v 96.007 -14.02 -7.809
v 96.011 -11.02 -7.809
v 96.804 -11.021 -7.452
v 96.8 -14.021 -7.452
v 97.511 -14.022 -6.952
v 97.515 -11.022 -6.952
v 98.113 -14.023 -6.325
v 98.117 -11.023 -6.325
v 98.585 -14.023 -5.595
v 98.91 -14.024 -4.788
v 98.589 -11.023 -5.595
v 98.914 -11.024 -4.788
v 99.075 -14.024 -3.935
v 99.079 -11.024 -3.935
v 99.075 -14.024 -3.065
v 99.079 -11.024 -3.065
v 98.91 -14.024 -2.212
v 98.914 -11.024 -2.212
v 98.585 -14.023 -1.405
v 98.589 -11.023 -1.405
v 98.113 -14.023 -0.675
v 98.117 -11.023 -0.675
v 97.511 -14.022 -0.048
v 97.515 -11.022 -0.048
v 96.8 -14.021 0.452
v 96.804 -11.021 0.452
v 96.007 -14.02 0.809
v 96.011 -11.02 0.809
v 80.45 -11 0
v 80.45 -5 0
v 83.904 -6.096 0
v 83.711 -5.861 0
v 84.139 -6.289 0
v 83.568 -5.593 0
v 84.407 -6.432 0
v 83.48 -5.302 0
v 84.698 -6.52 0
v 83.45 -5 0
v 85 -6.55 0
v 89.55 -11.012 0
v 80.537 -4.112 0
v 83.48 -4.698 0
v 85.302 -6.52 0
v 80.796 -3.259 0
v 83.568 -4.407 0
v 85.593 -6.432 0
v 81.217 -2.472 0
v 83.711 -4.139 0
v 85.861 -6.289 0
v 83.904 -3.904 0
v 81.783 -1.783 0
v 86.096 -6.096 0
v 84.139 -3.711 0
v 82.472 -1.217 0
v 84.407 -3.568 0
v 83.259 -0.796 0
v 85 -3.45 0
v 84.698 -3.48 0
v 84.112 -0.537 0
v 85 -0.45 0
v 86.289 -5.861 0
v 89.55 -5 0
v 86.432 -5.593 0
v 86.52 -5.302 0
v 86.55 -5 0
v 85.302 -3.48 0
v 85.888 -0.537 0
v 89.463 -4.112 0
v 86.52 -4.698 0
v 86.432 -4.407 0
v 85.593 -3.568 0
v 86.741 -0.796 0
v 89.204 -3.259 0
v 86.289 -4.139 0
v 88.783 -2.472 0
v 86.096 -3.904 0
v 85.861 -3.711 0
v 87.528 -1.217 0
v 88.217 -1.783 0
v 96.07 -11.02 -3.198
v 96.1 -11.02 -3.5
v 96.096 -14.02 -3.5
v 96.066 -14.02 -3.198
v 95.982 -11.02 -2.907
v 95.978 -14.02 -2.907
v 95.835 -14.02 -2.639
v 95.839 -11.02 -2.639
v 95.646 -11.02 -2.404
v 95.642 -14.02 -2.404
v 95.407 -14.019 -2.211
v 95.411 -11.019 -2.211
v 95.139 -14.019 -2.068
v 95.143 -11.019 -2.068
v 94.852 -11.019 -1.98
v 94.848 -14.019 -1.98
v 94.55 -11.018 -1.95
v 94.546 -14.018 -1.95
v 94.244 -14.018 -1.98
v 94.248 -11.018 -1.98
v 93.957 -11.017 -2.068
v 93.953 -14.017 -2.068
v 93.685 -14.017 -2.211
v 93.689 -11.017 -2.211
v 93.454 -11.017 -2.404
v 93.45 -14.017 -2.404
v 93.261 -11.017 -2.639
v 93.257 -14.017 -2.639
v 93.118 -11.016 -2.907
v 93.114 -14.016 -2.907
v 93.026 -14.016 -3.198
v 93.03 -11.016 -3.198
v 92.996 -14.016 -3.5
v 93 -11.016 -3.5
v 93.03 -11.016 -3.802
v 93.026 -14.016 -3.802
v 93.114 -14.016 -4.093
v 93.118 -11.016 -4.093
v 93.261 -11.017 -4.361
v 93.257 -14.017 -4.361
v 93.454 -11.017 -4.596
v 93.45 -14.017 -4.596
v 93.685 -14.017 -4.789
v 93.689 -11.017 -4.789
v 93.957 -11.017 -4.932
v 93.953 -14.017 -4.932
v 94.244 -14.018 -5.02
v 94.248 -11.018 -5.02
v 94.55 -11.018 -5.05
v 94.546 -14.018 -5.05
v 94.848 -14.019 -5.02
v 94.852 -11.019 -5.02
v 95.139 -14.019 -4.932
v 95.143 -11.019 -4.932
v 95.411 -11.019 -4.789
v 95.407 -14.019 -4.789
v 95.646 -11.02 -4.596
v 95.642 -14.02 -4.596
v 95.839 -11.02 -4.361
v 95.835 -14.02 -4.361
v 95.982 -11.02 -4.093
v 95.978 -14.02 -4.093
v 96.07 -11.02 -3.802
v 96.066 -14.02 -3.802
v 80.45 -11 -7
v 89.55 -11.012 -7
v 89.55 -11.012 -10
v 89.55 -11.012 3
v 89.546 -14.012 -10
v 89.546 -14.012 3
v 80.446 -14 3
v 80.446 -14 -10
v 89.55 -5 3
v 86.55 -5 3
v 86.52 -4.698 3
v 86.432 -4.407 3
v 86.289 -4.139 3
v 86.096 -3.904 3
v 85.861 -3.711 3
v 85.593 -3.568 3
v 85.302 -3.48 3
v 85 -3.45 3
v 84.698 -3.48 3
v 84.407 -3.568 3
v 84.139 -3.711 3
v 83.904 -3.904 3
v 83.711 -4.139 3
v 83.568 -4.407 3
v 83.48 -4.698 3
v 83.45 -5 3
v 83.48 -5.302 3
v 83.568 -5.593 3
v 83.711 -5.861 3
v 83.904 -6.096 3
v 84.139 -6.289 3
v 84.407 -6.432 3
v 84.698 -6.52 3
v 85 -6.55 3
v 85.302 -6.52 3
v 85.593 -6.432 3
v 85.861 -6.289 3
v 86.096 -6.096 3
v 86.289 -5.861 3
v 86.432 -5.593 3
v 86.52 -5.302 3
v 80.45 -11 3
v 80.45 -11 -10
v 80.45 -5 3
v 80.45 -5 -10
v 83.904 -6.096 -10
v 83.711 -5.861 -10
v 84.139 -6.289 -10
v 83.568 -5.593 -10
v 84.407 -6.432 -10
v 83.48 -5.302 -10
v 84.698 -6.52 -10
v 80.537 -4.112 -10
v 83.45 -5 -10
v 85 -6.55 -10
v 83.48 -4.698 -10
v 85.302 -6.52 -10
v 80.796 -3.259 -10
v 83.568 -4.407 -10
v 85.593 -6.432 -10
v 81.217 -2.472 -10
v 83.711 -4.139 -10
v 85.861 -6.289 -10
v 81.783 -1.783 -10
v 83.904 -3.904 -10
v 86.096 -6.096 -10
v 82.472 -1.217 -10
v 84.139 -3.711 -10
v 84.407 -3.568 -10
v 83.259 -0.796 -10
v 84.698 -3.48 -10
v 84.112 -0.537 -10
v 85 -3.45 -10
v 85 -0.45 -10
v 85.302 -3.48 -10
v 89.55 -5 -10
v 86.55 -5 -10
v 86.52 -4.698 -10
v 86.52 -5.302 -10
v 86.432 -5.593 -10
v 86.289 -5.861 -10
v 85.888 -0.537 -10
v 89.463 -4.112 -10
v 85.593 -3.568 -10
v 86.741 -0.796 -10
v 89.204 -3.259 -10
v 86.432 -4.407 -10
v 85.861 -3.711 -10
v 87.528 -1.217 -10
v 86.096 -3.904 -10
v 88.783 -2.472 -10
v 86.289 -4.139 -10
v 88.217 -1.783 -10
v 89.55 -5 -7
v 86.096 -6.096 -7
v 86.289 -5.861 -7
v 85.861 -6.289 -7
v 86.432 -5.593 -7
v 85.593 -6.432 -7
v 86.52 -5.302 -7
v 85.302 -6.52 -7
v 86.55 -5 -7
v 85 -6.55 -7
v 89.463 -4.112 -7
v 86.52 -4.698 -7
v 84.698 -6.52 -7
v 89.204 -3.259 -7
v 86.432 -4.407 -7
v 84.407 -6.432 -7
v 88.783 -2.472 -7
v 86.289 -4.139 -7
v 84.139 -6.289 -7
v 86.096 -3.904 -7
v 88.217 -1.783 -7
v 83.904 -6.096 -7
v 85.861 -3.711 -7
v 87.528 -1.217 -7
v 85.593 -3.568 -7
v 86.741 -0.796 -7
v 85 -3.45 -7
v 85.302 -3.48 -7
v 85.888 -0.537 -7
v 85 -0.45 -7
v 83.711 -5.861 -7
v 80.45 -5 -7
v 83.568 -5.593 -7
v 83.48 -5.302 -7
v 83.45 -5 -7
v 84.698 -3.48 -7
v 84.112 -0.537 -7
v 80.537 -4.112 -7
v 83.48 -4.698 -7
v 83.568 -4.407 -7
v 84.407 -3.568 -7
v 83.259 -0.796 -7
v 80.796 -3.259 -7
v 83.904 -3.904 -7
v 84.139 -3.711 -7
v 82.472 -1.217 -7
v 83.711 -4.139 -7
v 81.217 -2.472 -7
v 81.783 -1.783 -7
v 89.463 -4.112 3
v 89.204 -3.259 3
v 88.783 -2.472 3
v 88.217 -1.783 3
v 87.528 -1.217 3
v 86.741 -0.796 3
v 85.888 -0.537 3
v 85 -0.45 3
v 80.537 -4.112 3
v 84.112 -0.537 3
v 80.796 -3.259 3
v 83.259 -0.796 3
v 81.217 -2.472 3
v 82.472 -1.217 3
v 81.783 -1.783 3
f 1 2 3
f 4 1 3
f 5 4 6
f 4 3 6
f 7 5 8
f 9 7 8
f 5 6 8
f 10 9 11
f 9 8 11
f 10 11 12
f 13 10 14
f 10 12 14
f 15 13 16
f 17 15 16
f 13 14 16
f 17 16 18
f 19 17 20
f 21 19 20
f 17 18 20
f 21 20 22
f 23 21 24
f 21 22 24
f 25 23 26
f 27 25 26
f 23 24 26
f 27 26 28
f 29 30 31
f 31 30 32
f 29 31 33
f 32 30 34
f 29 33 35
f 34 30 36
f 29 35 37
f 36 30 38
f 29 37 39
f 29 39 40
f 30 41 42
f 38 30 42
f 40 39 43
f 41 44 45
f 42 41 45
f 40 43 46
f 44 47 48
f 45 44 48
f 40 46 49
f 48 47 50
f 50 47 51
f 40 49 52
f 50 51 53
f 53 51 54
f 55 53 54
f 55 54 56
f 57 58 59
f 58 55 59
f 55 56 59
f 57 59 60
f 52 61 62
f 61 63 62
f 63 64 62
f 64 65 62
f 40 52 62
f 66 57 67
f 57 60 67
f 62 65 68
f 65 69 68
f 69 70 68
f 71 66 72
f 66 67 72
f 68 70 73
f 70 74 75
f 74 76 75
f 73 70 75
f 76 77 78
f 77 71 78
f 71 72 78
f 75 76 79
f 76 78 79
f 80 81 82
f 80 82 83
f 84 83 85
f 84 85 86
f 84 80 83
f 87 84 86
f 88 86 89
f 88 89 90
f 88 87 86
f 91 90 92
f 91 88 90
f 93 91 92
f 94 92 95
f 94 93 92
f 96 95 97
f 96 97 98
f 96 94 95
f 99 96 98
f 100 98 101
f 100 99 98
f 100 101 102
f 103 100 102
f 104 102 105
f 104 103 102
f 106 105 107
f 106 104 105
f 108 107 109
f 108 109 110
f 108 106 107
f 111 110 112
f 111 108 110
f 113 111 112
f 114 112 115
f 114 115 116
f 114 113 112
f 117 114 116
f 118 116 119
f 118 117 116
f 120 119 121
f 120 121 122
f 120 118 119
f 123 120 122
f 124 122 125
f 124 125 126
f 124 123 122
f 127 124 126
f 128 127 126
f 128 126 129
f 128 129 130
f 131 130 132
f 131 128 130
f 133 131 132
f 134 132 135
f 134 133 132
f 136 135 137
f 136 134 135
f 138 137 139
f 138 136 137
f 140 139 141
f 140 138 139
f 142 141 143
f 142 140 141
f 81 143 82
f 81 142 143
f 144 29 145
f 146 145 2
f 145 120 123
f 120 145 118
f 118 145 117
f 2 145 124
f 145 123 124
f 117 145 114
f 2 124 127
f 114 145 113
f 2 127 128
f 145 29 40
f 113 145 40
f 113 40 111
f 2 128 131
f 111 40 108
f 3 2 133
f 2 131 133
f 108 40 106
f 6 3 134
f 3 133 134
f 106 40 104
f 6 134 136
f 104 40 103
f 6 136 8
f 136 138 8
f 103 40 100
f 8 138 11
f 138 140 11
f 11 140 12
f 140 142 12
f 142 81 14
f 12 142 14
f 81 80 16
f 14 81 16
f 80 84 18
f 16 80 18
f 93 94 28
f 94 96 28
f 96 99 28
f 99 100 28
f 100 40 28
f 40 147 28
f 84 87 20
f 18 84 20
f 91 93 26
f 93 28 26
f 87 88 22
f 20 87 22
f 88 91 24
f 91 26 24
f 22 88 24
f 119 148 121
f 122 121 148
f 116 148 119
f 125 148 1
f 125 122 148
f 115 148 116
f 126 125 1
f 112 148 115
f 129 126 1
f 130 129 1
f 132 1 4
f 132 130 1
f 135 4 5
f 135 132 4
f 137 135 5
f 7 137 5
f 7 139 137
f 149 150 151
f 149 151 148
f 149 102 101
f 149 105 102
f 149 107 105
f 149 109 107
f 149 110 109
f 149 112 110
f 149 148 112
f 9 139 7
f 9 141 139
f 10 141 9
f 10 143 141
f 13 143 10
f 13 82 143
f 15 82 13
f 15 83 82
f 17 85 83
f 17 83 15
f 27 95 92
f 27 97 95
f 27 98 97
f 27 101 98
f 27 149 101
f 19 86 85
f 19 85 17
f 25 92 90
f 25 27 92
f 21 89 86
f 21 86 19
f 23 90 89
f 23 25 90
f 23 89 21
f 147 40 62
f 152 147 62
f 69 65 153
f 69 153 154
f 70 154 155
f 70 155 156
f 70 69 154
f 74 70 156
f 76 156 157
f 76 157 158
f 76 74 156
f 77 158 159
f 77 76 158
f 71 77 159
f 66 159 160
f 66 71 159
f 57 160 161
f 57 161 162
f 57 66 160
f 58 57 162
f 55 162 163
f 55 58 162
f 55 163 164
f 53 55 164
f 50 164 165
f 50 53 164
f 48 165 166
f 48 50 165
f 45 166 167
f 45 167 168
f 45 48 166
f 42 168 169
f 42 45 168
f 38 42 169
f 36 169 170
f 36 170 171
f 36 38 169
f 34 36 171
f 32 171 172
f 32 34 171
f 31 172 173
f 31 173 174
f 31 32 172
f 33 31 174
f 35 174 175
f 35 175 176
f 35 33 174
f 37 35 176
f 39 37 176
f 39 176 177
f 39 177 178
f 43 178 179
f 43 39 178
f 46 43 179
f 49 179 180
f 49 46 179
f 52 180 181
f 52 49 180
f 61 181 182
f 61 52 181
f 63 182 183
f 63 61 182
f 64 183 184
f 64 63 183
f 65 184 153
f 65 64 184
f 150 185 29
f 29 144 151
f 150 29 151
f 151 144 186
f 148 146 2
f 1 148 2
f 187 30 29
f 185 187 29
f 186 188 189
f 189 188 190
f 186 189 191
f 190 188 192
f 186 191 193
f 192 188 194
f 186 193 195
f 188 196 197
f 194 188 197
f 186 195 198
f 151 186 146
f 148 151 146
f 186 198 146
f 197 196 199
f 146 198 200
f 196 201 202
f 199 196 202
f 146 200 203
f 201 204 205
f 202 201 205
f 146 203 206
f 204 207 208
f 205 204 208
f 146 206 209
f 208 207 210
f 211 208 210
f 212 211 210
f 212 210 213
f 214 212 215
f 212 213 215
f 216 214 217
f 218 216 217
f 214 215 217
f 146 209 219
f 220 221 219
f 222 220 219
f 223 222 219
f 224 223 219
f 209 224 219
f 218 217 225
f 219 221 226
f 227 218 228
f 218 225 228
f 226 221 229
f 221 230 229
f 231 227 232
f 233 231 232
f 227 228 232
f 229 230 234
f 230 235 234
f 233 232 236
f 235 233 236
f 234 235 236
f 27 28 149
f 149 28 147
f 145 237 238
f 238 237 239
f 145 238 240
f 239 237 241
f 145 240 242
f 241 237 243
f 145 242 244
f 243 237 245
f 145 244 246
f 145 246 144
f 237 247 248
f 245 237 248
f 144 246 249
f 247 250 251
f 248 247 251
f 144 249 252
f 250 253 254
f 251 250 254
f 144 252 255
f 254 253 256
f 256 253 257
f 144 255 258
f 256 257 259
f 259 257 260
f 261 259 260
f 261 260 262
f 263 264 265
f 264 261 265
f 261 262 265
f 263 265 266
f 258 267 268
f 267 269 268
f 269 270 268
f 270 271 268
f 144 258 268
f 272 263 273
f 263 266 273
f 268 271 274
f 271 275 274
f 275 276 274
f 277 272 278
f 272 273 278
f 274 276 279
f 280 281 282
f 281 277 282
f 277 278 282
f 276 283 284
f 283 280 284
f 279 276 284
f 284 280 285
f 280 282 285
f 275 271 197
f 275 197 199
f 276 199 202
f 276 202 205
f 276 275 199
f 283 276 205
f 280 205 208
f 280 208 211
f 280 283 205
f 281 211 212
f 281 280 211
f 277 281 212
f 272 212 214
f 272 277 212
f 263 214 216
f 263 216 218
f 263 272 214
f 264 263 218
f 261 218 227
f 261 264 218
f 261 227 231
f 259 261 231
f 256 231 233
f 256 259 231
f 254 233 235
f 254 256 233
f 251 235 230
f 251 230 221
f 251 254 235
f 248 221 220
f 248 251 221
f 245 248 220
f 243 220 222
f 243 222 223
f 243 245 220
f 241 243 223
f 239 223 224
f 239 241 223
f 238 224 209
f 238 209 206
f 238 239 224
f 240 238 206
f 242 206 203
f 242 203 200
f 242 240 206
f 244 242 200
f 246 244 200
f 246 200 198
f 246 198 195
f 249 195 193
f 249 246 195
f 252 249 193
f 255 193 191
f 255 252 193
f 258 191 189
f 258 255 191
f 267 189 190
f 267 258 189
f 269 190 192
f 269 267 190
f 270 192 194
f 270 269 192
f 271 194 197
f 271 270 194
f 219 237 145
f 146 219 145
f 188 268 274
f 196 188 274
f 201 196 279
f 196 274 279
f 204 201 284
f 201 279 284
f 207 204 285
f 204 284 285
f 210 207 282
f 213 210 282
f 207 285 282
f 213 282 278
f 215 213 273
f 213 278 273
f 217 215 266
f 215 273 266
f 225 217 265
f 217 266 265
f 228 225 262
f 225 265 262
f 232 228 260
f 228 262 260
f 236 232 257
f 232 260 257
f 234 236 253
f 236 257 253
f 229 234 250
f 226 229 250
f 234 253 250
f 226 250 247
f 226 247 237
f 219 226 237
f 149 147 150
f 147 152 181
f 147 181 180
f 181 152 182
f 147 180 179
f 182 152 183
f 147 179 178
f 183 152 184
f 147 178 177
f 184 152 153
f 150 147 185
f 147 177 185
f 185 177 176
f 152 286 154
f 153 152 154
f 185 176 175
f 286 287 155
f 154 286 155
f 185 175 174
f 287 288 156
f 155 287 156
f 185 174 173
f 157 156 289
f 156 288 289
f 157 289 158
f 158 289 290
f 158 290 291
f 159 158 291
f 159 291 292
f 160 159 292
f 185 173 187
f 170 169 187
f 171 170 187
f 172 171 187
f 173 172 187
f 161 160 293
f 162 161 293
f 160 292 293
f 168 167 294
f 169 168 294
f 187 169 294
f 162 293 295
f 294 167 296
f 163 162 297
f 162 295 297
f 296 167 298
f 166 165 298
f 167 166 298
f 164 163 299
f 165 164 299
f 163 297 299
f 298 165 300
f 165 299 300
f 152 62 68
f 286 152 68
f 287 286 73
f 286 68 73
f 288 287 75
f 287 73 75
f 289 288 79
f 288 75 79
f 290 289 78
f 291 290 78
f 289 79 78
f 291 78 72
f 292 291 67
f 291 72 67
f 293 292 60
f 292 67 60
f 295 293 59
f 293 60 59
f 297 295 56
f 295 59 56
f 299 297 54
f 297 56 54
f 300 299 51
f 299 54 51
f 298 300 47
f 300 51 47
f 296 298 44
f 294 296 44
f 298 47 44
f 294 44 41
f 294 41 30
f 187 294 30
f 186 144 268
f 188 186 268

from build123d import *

# Parameters (mm, degrees)
SKETCH1_R           = 1.55
BOSS_EXTRUDE1_DEPTH = 3
SKETCH2_R           = 1.55
BOSS_EXTRUDE2_DEPTH = 3
SKETCH3_R           = 1.55
BOSS_EXTRUDE3_DEPTH = 3


with BuildPart() as part:
    # Sketch1 → Boss-Extrude1 (new body)
    with BuildSketch(Plane.XY):
        with BuildLine():
            ThreePointArc((89.55, -5), (85, -0.45), (80.45, -5))
            Line((80.45, -5), (80.45, -11))
            Line((80.45, -11), (89.55, -11.011788251))
            Line((89.55, -11.011788251), (89.55, -5))
        make_face()
        with Locations((85, -5)):
            Circle(SKETCH1_R, mode=Mode.SUBTRACT)
    extrude(amount=BOSS_EXTRUDE1_DEPTH)



with BuildPart() as body_2:
    # Sketch2 → Boss-Extrude2 (new body)
    with BuildSketch(Plane(origin=(0, 0, -7), x_dir=(-1, 0, 0), z_dir=(0, 0, -1))):
        with BuildLine():
            Line((-89.55, -11.011788251), (-80.45, -11))
            Line((-80.45, -11), (-80.45, -5))
            ThreePointArc((-80.45, -5), (-85, -0.45), (-89.55, -5))
            Line((-89.55, -5), (-89.55, -11.011788251))
        make_face()
        with Locations((-85, -5)):
            Circle(SKETCH2_R, mode=Mode.SUBTRACT)
    extrude(amount=BOSS_EXTRUDE2_DEPTH)


with BuildPart() as part_1:
    add(part.part)

    add(body_2.part)  # Boss-Extrude3 merges body 2
    # Sketch3 → Boss-Extrude3 (add)
    with BuildSketch(Plane(origin=(-0.014114508, -10.895765801, 0), x_dir=(0.999999161, -0.001295411, 0), z_dir=(-0.001295411, -0.999999161, 0))):
        with BuildLine():
            Line((89.564189657, 3), (80.464182022, 3))
            Line((80.464182022, 3), (80.464182022, -10))
            Line((80.464182022, -10), (89.564189657, -10))
            Line((89.564189657, -10), (96.025380607, -7.808993039))
            ThreePointArc((96.025380607, -7.808993039), (99.114189657, -3.5), (96.025380607, 0.808993039))
            Line((96.025380607, 0.808993039), (89.564189657, 3))
        make_face()
        with Locations((94.564189657, -3.5)):
            Circle(SKETCH3_R, mode=Mode.SUBTRACT)
    extrude(amount=BOSS_EXTRUDE3_DEPTH)


solid = part_1.part
